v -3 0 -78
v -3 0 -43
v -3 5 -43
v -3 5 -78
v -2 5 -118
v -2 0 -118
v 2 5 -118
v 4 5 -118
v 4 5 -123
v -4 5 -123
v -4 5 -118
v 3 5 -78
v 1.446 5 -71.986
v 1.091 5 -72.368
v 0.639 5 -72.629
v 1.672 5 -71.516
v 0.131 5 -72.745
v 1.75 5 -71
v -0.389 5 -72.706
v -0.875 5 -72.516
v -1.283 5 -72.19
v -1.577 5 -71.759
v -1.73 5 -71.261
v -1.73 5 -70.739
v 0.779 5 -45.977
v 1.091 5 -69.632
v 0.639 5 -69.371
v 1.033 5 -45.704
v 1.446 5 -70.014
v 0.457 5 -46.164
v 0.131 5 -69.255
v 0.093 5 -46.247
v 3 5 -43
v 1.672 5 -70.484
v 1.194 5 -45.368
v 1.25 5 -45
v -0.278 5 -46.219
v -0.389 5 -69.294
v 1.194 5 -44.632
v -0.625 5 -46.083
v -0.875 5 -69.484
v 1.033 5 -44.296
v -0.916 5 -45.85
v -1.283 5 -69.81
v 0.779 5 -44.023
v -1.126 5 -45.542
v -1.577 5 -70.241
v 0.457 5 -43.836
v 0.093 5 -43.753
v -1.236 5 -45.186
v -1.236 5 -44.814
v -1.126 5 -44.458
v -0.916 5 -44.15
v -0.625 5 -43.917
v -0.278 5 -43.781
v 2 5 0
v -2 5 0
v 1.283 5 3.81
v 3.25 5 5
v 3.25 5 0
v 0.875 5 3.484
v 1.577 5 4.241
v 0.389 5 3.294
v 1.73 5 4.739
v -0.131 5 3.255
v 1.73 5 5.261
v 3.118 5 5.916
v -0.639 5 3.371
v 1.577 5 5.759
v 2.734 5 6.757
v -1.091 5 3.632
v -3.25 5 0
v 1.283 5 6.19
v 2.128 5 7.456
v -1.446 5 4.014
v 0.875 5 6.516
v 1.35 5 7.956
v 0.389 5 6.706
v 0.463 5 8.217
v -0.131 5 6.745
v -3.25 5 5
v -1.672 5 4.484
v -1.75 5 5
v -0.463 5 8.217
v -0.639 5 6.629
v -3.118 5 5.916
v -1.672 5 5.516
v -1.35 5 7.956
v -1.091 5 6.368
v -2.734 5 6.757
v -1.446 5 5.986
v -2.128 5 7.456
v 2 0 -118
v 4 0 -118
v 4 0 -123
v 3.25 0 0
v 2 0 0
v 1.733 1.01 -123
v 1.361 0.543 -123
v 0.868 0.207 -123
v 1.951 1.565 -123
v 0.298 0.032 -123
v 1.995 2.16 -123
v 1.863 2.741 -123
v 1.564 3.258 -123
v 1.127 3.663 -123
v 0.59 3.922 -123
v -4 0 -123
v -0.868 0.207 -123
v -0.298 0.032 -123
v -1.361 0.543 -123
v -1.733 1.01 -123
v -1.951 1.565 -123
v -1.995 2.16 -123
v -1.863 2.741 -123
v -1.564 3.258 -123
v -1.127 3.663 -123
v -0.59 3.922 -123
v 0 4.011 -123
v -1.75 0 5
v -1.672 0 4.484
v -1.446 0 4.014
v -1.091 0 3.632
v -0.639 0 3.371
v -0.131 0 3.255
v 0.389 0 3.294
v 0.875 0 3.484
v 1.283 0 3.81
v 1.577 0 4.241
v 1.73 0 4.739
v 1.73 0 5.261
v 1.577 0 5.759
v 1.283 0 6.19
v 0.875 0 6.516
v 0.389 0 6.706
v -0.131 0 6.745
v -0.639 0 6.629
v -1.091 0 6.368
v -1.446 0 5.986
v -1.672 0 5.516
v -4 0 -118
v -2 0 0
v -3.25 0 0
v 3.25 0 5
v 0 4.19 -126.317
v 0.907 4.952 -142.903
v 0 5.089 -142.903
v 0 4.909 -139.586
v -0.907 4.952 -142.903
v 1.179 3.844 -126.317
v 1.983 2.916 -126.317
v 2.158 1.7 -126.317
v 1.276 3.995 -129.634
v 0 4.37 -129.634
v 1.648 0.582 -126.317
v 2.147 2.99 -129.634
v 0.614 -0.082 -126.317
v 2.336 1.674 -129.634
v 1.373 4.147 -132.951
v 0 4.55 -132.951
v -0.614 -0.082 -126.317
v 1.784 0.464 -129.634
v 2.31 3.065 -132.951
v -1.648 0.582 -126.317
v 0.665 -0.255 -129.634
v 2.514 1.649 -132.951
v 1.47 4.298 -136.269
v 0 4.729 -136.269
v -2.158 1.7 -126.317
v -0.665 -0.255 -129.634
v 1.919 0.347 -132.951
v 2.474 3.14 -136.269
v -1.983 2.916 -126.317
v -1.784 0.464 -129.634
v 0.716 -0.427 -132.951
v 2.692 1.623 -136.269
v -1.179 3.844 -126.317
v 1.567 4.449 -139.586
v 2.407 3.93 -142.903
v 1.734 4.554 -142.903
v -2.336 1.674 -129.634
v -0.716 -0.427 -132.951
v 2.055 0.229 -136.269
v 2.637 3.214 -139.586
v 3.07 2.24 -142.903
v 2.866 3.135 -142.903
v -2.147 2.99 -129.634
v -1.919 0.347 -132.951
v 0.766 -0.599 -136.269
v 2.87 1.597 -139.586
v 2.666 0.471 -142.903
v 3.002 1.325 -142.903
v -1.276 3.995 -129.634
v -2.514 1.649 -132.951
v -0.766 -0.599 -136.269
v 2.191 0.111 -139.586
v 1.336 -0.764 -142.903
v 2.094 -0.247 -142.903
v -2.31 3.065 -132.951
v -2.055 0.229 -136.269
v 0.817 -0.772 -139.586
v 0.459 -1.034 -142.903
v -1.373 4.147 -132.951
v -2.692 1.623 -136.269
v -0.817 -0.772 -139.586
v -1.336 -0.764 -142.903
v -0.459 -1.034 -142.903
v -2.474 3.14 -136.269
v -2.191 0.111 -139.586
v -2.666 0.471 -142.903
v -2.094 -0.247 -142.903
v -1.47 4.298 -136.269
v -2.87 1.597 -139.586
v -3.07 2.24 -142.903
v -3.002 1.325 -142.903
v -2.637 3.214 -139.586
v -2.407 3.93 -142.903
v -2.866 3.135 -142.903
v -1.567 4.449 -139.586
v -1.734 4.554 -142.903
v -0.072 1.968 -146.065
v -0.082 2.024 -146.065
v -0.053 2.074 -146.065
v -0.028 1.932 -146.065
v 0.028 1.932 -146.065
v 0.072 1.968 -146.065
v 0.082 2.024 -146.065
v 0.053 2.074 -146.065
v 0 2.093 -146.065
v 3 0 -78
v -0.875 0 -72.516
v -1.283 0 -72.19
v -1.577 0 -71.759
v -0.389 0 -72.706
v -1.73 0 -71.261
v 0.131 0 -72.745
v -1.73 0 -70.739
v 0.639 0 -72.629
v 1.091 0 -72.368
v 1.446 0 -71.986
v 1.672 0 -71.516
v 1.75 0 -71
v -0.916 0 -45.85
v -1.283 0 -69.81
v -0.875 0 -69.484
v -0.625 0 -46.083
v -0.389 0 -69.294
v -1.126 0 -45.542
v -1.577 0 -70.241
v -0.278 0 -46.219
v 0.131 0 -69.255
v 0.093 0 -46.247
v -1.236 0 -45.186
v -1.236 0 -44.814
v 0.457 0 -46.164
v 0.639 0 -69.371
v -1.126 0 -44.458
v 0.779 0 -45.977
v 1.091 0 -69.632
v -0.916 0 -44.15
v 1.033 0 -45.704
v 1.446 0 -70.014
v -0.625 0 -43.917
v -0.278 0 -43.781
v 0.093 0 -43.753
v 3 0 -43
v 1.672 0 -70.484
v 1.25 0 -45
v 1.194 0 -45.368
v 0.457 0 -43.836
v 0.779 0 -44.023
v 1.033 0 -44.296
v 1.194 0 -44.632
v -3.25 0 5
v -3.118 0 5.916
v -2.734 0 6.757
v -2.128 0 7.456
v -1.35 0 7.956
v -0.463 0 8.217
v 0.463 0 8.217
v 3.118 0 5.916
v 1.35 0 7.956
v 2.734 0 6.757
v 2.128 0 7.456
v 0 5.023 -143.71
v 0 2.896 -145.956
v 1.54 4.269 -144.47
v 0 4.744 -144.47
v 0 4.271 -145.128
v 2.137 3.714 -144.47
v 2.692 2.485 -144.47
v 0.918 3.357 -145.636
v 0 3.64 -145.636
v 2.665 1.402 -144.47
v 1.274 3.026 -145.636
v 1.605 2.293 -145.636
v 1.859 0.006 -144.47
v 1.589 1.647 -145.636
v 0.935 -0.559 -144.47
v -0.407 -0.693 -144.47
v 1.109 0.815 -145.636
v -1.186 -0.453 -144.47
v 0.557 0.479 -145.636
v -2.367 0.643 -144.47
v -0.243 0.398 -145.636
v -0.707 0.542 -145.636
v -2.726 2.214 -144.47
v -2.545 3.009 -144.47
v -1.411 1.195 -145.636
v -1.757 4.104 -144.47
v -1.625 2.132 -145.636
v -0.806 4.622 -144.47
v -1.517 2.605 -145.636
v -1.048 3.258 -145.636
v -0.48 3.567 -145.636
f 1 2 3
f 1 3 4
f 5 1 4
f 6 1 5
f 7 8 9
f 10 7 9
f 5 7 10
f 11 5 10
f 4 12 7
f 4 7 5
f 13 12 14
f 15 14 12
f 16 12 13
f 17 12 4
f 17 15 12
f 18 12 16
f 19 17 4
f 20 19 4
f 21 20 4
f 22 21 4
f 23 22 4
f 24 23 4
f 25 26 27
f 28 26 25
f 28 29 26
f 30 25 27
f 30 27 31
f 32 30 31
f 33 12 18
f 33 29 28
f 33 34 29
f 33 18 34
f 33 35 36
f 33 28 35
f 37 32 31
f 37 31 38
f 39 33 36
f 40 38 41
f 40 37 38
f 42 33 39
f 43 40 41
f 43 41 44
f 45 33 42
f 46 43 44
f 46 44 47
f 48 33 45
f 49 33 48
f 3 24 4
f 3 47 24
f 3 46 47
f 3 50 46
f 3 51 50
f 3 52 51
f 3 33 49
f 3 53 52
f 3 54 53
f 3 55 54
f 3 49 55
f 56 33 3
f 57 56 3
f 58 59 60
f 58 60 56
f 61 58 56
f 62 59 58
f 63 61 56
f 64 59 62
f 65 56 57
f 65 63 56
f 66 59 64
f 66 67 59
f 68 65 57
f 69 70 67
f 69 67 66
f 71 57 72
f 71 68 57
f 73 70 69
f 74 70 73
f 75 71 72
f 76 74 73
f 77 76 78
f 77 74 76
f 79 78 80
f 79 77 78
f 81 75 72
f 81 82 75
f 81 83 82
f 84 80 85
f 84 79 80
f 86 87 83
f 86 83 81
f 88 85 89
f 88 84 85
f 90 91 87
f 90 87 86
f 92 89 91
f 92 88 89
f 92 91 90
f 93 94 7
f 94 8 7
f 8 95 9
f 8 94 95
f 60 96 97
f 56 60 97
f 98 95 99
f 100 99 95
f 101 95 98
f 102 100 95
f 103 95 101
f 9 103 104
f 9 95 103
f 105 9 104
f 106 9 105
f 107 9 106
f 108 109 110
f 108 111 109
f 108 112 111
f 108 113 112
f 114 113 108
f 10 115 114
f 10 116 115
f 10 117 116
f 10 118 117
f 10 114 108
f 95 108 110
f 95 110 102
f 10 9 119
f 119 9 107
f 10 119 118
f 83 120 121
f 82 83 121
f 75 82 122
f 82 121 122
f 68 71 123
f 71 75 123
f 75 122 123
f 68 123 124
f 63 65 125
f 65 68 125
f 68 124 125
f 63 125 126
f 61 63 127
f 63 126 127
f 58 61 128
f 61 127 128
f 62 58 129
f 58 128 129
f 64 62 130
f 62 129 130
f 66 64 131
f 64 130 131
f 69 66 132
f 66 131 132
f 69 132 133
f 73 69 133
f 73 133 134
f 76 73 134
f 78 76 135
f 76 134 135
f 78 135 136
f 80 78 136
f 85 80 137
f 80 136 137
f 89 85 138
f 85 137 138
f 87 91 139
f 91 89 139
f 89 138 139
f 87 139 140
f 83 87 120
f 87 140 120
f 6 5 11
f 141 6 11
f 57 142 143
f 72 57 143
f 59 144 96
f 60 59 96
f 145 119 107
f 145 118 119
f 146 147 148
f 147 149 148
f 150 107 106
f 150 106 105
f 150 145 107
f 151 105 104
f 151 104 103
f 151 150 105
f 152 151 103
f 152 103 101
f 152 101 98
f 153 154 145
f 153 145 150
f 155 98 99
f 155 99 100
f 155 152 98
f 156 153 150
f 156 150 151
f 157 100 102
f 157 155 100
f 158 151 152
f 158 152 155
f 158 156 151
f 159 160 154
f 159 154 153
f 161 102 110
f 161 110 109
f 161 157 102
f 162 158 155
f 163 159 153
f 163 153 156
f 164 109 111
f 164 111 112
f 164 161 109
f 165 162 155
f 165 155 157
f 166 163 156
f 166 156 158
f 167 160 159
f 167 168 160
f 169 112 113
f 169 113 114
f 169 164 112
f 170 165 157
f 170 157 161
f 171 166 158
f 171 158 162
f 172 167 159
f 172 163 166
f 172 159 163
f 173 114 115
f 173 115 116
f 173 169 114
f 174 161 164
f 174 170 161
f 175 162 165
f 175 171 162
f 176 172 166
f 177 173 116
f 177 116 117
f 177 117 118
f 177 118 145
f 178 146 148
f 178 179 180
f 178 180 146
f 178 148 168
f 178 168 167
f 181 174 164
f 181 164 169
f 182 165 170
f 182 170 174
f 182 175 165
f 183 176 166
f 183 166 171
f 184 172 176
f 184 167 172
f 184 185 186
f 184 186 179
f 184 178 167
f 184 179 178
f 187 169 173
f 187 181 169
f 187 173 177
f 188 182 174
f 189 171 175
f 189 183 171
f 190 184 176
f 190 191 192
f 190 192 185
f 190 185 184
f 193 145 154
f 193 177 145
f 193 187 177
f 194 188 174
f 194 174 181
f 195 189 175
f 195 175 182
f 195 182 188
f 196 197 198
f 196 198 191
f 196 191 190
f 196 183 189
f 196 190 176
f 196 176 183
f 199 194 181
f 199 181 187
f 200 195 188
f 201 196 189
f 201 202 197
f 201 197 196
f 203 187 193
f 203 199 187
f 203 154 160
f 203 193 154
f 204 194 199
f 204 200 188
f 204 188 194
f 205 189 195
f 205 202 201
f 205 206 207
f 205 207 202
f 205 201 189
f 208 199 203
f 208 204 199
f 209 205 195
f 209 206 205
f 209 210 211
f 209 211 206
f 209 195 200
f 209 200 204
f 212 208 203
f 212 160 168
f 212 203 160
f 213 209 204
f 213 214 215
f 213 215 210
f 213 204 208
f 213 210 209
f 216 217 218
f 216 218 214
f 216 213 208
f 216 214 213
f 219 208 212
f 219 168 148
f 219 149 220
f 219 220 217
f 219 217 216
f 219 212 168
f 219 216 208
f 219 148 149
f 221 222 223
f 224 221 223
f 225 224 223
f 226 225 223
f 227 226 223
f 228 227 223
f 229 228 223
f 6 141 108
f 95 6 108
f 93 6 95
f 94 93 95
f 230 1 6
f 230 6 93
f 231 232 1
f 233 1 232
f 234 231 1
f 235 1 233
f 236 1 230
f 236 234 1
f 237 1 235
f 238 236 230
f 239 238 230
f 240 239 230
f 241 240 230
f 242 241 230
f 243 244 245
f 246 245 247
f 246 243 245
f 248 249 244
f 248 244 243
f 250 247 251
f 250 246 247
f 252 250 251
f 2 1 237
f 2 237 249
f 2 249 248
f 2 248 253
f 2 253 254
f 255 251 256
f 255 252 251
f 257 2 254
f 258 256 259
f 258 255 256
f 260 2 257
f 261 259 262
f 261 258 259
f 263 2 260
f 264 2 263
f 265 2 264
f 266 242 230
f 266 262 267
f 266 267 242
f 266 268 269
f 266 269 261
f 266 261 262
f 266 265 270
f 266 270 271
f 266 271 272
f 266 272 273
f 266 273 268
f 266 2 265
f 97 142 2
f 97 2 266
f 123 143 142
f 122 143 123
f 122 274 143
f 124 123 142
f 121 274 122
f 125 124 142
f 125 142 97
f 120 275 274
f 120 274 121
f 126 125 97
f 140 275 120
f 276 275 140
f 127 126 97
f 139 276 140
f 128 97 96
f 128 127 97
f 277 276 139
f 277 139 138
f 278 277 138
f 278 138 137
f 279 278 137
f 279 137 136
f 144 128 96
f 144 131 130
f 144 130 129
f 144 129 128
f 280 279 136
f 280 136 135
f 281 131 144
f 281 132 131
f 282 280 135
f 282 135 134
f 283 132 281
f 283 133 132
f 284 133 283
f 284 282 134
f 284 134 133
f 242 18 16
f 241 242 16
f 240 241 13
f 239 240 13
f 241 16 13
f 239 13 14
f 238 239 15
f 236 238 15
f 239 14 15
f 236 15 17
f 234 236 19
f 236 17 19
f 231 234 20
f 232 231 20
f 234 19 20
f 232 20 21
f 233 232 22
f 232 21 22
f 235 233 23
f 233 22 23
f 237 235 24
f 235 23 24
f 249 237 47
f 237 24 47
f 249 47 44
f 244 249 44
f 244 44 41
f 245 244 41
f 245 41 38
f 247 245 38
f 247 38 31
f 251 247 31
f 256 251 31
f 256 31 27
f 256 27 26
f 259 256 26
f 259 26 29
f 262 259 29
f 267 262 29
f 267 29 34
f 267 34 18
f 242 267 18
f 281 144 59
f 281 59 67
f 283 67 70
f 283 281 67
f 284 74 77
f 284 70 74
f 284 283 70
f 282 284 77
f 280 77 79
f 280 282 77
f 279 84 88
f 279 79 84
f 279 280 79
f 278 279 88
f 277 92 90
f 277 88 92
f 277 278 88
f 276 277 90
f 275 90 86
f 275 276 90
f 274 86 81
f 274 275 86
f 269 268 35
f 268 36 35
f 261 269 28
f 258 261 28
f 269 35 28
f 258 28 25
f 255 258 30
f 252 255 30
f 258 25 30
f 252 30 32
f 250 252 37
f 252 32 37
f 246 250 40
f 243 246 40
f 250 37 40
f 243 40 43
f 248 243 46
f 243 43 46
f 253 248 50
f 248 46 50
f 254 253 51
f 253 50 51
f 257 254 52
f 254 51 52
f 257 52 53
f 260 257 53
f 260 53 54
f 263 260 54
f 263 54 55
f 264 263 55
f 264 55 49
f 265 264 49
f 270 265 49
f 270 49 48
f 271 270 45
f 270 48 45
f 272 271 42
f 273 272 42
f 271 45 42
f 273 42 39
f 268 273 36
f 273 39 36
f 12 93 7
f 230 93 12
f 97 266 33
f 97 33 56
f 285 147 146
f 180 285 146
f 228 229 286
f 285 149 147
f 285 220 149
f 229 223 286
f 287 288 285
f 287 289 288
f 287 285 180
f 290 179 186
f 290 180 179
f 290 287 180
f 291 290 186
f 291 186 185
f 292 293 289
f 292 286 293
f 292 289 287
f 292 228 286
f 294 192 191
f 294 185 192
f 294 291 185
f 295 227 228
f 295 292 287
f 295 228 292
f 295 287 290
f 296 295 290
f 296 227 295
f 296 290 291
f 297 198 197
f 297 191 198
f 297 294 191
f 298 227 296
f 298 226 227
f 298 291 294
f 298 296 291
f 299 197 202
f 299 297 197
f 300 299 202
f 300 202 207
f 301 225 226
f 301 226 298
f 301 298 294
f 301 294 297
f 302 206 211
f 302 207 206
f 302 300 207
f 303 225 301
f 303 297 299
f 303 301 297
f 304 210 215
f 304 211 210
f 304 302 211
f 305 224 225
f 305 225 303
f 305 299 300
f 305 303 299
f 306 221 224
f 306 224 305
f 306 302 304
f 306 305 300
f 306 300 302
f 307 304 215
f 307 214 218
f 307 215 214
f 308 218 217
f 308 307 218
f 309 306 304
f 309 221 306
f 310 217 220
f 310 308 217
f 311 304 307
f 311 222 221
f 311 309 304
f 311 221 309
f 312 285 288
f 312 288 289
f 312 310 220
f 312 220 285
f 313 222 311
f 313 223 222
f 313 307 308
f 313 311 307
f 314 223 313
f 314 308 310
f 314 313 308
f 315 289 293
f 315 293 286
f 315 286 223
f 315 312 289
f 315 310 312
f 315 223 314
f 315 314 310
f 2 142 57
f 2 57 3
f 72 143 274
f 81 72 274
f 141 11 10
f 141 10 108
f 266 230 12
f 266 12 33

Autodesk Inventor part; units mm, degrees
ref_plane "XZ Plane" through (0, 0, 0) normal (0, 1, 0) x (-1, 0, 0)
ref_plane "XY Plane" through (0, 0, 0) normal (0, 0, 1) x (1, 0, 0)
sketch "Sketch1" plane through (0, 0, 0) normal (0, 1, 0) x (-1, 0, 0)
  line L0 (-3.25, 5) -> (-3.25, 0)
  line L1 (-3.25, 0) -> (3.25, 0)
  line L2 (3.25, 0) -> (3.25, 5)
  line L3 (2, 0) -> (-2, 0)
  line L4 (3, -43) -> (3, -78)
  line L5 (-3, -78) -> (-3, -43)
  line L6 (2, -118) -> (-2, -118)
  circle A0 centre (0, 5) radius 1.75
  arc A1 (3.25, 5) -> (-3.25, 5) centre (0, 5) ccw
  line L7 (2, 0) -> (3, -43)
  line L8 (-3, -43) -> (-2, 0)
  line L9 (3, -78) -> (2, -118)
  line L10 (-2, -118) -> (-3, -78)
  point P0 (0, 0)
  point P1 (0, 0)
  point P2 (0, 0)
  point P3 (0, -43)
  point P4 (0, -78)
  dimension "d0" = 6.5
  dimension "d1" = 5
  dimension "d2" = 6
  dimension "d3" = 4
  dimension "d4" = 3.5
  dimension "d5" = 90
  dimension "d6" = 91.332
  dimension "d7" = 88.568
  dimension "d8" = 91.332
  dimension "d9" = 88.568
  dimension "d10" = 118
  dimension "d11" = 0.25
  dimension "d12" = 6.25
  dimension "d13" = 1.9995
  dimension "d14" = 43
  dimension "d15" = 3.25
  dimension "d16" = 78
  dimension "d17" = 3.25
  dimension "d18" = 0
  dimension "d19" = 3.25
extrude "Extrusion1" add sketch "Sketch1" along normal blind 5
sketch "Sketch2" plane through (0, 5, 0) normal (0, 1, 0) x (1, 0, 0)
  circle A0 centre (0, 45) radius 1.25
  circle A1 centre (0, 71) radius 1.75
  circle A2 centre (0, -5) radius 1.75 construction
  circle A3 centre (0, -5) radius 1.75 construction
  point P0 (0, 0)
  point P1 (0, 0)
  dimension "d22" = 2.5
  dimension "d23" = 3.5
  dimension "d25" = 3.5
  dimension "d26" = 50
  dimension "d116" = 45
  dimension "d117" = 0
  dimension "d118" = 76
extrude "Extrusion2" cut sketch "Sketch2" against normal through all
sketch "Sketch6" plane through (2, 0, -118) normal (0, 0, -1) x (-1, 0, 0)
  line L0 (0, 5) -> (4, 5) projected
  line L1 (0.75, 5) -> (3.25, 5) projected
  line L2 (2, 5) -> (-2, 5)
  line L3 (2, 5) -> (6, 5)
  line L4 (6, 5) -> (6, 0)
  line L5 (6, 0) -> (-2, 0)
  line L6 (5.25, 0) -> (-1.25, 0) projected
  line L7 (-2, 0) -> (-2, 5)
  dimension "d43" = 4
  dimension "d44" = 4
  dimension "d45" = 5
  dimension "d46" = 8
extrude "Extrusion5" add sketch "Sketch6" along normal blind 5
ref_plane "Work Plane1" through (0, 0, 0) normal (1, 0, 0) x (0, 1, 0)
sketch "Sketch11" plane through (0, 0, 0) normal (1, 0, 0) x (0, 1, 0)
  line L0 (4.51, -121.065) -> (4.51, -116.065) construction
  line L1 (2.01, -122.9844) -> (4.01, -122.9844)
  line L2 (4.01, -122.9844) -> (5.26, -146.065)
  line L3 (5.26, -146.065) -> (2.01, -146.065)
  line L4 (2.01, -146.065) -> (2.01, -122.9844)
  line L5 (0, -118) -> (5, -118) projected
  line L6 (5, -43.75) -> (5, -46.25) projected
  line L7 (5, -69.25) -> (5, -72.75) projected
  line L8 (5, 6.75) -> (5, 3.25) projected
  line L9 (5, 5) -> (5, 5) projected
  line L10 (5, 5) -> (5, 0) projected
  line L11 (5, 0) -> (5, -43) projected
  line L12 (5, -43) -> (5, -78) projected
  line L13 (5, -78) -> (5, -118) projected
  line L14 (5, -118) -> (5, -123) projected
  line L15 (5, -118) -> (5, -123) projected
  line L16 (5, -118) -> (5, -78) projected
  line L17 (5, -78) -> (5, -43) projected
  line L18 (5, -43) -> (5, 0) projected
  line L19 (5, 0) -> (5, 5) projected
  line L20 (0.51, -143.3532) -> (0.51, -134.9626)
  line L21 (4.635, -134.5247) -> (4.635, -134.5247)
  line L22 (7.1466, -143.3532) -> (7.1466, -134.9626)
  point P0 (0, 0)
  point P1 (0, 0)
  dimension "d67" = 2
  dimension "d68" = 3.25
  dimension "d72" = 2.6467
  dimension "d73" = 30
  dimension "d76" = 2.6467
  dimension "d78" = 1.5
  dimension "d80" = 177.138
  dimension "d81" = 6.6366
  dimension "d82" = 3.1
  dimension "d107" = 0.49
  dimension "d109" = 16.9626
  dimension "d110" = 25.3532
  dimension "d111" = 3.065
  dimension "d112" = 16.9626
  dimension "d113" = 25.3532
  dimension "d114" = 7.1466
revolve "Revolution2" add sketch "Sketch11" angle 360 about axis through (0, 2.01, -146.065) along (0, 0, 1)
fillet "Fillet1" radius 3 1 edges at (0, -1.24, -146.065)
properties part number "reverse gear rever lever"
